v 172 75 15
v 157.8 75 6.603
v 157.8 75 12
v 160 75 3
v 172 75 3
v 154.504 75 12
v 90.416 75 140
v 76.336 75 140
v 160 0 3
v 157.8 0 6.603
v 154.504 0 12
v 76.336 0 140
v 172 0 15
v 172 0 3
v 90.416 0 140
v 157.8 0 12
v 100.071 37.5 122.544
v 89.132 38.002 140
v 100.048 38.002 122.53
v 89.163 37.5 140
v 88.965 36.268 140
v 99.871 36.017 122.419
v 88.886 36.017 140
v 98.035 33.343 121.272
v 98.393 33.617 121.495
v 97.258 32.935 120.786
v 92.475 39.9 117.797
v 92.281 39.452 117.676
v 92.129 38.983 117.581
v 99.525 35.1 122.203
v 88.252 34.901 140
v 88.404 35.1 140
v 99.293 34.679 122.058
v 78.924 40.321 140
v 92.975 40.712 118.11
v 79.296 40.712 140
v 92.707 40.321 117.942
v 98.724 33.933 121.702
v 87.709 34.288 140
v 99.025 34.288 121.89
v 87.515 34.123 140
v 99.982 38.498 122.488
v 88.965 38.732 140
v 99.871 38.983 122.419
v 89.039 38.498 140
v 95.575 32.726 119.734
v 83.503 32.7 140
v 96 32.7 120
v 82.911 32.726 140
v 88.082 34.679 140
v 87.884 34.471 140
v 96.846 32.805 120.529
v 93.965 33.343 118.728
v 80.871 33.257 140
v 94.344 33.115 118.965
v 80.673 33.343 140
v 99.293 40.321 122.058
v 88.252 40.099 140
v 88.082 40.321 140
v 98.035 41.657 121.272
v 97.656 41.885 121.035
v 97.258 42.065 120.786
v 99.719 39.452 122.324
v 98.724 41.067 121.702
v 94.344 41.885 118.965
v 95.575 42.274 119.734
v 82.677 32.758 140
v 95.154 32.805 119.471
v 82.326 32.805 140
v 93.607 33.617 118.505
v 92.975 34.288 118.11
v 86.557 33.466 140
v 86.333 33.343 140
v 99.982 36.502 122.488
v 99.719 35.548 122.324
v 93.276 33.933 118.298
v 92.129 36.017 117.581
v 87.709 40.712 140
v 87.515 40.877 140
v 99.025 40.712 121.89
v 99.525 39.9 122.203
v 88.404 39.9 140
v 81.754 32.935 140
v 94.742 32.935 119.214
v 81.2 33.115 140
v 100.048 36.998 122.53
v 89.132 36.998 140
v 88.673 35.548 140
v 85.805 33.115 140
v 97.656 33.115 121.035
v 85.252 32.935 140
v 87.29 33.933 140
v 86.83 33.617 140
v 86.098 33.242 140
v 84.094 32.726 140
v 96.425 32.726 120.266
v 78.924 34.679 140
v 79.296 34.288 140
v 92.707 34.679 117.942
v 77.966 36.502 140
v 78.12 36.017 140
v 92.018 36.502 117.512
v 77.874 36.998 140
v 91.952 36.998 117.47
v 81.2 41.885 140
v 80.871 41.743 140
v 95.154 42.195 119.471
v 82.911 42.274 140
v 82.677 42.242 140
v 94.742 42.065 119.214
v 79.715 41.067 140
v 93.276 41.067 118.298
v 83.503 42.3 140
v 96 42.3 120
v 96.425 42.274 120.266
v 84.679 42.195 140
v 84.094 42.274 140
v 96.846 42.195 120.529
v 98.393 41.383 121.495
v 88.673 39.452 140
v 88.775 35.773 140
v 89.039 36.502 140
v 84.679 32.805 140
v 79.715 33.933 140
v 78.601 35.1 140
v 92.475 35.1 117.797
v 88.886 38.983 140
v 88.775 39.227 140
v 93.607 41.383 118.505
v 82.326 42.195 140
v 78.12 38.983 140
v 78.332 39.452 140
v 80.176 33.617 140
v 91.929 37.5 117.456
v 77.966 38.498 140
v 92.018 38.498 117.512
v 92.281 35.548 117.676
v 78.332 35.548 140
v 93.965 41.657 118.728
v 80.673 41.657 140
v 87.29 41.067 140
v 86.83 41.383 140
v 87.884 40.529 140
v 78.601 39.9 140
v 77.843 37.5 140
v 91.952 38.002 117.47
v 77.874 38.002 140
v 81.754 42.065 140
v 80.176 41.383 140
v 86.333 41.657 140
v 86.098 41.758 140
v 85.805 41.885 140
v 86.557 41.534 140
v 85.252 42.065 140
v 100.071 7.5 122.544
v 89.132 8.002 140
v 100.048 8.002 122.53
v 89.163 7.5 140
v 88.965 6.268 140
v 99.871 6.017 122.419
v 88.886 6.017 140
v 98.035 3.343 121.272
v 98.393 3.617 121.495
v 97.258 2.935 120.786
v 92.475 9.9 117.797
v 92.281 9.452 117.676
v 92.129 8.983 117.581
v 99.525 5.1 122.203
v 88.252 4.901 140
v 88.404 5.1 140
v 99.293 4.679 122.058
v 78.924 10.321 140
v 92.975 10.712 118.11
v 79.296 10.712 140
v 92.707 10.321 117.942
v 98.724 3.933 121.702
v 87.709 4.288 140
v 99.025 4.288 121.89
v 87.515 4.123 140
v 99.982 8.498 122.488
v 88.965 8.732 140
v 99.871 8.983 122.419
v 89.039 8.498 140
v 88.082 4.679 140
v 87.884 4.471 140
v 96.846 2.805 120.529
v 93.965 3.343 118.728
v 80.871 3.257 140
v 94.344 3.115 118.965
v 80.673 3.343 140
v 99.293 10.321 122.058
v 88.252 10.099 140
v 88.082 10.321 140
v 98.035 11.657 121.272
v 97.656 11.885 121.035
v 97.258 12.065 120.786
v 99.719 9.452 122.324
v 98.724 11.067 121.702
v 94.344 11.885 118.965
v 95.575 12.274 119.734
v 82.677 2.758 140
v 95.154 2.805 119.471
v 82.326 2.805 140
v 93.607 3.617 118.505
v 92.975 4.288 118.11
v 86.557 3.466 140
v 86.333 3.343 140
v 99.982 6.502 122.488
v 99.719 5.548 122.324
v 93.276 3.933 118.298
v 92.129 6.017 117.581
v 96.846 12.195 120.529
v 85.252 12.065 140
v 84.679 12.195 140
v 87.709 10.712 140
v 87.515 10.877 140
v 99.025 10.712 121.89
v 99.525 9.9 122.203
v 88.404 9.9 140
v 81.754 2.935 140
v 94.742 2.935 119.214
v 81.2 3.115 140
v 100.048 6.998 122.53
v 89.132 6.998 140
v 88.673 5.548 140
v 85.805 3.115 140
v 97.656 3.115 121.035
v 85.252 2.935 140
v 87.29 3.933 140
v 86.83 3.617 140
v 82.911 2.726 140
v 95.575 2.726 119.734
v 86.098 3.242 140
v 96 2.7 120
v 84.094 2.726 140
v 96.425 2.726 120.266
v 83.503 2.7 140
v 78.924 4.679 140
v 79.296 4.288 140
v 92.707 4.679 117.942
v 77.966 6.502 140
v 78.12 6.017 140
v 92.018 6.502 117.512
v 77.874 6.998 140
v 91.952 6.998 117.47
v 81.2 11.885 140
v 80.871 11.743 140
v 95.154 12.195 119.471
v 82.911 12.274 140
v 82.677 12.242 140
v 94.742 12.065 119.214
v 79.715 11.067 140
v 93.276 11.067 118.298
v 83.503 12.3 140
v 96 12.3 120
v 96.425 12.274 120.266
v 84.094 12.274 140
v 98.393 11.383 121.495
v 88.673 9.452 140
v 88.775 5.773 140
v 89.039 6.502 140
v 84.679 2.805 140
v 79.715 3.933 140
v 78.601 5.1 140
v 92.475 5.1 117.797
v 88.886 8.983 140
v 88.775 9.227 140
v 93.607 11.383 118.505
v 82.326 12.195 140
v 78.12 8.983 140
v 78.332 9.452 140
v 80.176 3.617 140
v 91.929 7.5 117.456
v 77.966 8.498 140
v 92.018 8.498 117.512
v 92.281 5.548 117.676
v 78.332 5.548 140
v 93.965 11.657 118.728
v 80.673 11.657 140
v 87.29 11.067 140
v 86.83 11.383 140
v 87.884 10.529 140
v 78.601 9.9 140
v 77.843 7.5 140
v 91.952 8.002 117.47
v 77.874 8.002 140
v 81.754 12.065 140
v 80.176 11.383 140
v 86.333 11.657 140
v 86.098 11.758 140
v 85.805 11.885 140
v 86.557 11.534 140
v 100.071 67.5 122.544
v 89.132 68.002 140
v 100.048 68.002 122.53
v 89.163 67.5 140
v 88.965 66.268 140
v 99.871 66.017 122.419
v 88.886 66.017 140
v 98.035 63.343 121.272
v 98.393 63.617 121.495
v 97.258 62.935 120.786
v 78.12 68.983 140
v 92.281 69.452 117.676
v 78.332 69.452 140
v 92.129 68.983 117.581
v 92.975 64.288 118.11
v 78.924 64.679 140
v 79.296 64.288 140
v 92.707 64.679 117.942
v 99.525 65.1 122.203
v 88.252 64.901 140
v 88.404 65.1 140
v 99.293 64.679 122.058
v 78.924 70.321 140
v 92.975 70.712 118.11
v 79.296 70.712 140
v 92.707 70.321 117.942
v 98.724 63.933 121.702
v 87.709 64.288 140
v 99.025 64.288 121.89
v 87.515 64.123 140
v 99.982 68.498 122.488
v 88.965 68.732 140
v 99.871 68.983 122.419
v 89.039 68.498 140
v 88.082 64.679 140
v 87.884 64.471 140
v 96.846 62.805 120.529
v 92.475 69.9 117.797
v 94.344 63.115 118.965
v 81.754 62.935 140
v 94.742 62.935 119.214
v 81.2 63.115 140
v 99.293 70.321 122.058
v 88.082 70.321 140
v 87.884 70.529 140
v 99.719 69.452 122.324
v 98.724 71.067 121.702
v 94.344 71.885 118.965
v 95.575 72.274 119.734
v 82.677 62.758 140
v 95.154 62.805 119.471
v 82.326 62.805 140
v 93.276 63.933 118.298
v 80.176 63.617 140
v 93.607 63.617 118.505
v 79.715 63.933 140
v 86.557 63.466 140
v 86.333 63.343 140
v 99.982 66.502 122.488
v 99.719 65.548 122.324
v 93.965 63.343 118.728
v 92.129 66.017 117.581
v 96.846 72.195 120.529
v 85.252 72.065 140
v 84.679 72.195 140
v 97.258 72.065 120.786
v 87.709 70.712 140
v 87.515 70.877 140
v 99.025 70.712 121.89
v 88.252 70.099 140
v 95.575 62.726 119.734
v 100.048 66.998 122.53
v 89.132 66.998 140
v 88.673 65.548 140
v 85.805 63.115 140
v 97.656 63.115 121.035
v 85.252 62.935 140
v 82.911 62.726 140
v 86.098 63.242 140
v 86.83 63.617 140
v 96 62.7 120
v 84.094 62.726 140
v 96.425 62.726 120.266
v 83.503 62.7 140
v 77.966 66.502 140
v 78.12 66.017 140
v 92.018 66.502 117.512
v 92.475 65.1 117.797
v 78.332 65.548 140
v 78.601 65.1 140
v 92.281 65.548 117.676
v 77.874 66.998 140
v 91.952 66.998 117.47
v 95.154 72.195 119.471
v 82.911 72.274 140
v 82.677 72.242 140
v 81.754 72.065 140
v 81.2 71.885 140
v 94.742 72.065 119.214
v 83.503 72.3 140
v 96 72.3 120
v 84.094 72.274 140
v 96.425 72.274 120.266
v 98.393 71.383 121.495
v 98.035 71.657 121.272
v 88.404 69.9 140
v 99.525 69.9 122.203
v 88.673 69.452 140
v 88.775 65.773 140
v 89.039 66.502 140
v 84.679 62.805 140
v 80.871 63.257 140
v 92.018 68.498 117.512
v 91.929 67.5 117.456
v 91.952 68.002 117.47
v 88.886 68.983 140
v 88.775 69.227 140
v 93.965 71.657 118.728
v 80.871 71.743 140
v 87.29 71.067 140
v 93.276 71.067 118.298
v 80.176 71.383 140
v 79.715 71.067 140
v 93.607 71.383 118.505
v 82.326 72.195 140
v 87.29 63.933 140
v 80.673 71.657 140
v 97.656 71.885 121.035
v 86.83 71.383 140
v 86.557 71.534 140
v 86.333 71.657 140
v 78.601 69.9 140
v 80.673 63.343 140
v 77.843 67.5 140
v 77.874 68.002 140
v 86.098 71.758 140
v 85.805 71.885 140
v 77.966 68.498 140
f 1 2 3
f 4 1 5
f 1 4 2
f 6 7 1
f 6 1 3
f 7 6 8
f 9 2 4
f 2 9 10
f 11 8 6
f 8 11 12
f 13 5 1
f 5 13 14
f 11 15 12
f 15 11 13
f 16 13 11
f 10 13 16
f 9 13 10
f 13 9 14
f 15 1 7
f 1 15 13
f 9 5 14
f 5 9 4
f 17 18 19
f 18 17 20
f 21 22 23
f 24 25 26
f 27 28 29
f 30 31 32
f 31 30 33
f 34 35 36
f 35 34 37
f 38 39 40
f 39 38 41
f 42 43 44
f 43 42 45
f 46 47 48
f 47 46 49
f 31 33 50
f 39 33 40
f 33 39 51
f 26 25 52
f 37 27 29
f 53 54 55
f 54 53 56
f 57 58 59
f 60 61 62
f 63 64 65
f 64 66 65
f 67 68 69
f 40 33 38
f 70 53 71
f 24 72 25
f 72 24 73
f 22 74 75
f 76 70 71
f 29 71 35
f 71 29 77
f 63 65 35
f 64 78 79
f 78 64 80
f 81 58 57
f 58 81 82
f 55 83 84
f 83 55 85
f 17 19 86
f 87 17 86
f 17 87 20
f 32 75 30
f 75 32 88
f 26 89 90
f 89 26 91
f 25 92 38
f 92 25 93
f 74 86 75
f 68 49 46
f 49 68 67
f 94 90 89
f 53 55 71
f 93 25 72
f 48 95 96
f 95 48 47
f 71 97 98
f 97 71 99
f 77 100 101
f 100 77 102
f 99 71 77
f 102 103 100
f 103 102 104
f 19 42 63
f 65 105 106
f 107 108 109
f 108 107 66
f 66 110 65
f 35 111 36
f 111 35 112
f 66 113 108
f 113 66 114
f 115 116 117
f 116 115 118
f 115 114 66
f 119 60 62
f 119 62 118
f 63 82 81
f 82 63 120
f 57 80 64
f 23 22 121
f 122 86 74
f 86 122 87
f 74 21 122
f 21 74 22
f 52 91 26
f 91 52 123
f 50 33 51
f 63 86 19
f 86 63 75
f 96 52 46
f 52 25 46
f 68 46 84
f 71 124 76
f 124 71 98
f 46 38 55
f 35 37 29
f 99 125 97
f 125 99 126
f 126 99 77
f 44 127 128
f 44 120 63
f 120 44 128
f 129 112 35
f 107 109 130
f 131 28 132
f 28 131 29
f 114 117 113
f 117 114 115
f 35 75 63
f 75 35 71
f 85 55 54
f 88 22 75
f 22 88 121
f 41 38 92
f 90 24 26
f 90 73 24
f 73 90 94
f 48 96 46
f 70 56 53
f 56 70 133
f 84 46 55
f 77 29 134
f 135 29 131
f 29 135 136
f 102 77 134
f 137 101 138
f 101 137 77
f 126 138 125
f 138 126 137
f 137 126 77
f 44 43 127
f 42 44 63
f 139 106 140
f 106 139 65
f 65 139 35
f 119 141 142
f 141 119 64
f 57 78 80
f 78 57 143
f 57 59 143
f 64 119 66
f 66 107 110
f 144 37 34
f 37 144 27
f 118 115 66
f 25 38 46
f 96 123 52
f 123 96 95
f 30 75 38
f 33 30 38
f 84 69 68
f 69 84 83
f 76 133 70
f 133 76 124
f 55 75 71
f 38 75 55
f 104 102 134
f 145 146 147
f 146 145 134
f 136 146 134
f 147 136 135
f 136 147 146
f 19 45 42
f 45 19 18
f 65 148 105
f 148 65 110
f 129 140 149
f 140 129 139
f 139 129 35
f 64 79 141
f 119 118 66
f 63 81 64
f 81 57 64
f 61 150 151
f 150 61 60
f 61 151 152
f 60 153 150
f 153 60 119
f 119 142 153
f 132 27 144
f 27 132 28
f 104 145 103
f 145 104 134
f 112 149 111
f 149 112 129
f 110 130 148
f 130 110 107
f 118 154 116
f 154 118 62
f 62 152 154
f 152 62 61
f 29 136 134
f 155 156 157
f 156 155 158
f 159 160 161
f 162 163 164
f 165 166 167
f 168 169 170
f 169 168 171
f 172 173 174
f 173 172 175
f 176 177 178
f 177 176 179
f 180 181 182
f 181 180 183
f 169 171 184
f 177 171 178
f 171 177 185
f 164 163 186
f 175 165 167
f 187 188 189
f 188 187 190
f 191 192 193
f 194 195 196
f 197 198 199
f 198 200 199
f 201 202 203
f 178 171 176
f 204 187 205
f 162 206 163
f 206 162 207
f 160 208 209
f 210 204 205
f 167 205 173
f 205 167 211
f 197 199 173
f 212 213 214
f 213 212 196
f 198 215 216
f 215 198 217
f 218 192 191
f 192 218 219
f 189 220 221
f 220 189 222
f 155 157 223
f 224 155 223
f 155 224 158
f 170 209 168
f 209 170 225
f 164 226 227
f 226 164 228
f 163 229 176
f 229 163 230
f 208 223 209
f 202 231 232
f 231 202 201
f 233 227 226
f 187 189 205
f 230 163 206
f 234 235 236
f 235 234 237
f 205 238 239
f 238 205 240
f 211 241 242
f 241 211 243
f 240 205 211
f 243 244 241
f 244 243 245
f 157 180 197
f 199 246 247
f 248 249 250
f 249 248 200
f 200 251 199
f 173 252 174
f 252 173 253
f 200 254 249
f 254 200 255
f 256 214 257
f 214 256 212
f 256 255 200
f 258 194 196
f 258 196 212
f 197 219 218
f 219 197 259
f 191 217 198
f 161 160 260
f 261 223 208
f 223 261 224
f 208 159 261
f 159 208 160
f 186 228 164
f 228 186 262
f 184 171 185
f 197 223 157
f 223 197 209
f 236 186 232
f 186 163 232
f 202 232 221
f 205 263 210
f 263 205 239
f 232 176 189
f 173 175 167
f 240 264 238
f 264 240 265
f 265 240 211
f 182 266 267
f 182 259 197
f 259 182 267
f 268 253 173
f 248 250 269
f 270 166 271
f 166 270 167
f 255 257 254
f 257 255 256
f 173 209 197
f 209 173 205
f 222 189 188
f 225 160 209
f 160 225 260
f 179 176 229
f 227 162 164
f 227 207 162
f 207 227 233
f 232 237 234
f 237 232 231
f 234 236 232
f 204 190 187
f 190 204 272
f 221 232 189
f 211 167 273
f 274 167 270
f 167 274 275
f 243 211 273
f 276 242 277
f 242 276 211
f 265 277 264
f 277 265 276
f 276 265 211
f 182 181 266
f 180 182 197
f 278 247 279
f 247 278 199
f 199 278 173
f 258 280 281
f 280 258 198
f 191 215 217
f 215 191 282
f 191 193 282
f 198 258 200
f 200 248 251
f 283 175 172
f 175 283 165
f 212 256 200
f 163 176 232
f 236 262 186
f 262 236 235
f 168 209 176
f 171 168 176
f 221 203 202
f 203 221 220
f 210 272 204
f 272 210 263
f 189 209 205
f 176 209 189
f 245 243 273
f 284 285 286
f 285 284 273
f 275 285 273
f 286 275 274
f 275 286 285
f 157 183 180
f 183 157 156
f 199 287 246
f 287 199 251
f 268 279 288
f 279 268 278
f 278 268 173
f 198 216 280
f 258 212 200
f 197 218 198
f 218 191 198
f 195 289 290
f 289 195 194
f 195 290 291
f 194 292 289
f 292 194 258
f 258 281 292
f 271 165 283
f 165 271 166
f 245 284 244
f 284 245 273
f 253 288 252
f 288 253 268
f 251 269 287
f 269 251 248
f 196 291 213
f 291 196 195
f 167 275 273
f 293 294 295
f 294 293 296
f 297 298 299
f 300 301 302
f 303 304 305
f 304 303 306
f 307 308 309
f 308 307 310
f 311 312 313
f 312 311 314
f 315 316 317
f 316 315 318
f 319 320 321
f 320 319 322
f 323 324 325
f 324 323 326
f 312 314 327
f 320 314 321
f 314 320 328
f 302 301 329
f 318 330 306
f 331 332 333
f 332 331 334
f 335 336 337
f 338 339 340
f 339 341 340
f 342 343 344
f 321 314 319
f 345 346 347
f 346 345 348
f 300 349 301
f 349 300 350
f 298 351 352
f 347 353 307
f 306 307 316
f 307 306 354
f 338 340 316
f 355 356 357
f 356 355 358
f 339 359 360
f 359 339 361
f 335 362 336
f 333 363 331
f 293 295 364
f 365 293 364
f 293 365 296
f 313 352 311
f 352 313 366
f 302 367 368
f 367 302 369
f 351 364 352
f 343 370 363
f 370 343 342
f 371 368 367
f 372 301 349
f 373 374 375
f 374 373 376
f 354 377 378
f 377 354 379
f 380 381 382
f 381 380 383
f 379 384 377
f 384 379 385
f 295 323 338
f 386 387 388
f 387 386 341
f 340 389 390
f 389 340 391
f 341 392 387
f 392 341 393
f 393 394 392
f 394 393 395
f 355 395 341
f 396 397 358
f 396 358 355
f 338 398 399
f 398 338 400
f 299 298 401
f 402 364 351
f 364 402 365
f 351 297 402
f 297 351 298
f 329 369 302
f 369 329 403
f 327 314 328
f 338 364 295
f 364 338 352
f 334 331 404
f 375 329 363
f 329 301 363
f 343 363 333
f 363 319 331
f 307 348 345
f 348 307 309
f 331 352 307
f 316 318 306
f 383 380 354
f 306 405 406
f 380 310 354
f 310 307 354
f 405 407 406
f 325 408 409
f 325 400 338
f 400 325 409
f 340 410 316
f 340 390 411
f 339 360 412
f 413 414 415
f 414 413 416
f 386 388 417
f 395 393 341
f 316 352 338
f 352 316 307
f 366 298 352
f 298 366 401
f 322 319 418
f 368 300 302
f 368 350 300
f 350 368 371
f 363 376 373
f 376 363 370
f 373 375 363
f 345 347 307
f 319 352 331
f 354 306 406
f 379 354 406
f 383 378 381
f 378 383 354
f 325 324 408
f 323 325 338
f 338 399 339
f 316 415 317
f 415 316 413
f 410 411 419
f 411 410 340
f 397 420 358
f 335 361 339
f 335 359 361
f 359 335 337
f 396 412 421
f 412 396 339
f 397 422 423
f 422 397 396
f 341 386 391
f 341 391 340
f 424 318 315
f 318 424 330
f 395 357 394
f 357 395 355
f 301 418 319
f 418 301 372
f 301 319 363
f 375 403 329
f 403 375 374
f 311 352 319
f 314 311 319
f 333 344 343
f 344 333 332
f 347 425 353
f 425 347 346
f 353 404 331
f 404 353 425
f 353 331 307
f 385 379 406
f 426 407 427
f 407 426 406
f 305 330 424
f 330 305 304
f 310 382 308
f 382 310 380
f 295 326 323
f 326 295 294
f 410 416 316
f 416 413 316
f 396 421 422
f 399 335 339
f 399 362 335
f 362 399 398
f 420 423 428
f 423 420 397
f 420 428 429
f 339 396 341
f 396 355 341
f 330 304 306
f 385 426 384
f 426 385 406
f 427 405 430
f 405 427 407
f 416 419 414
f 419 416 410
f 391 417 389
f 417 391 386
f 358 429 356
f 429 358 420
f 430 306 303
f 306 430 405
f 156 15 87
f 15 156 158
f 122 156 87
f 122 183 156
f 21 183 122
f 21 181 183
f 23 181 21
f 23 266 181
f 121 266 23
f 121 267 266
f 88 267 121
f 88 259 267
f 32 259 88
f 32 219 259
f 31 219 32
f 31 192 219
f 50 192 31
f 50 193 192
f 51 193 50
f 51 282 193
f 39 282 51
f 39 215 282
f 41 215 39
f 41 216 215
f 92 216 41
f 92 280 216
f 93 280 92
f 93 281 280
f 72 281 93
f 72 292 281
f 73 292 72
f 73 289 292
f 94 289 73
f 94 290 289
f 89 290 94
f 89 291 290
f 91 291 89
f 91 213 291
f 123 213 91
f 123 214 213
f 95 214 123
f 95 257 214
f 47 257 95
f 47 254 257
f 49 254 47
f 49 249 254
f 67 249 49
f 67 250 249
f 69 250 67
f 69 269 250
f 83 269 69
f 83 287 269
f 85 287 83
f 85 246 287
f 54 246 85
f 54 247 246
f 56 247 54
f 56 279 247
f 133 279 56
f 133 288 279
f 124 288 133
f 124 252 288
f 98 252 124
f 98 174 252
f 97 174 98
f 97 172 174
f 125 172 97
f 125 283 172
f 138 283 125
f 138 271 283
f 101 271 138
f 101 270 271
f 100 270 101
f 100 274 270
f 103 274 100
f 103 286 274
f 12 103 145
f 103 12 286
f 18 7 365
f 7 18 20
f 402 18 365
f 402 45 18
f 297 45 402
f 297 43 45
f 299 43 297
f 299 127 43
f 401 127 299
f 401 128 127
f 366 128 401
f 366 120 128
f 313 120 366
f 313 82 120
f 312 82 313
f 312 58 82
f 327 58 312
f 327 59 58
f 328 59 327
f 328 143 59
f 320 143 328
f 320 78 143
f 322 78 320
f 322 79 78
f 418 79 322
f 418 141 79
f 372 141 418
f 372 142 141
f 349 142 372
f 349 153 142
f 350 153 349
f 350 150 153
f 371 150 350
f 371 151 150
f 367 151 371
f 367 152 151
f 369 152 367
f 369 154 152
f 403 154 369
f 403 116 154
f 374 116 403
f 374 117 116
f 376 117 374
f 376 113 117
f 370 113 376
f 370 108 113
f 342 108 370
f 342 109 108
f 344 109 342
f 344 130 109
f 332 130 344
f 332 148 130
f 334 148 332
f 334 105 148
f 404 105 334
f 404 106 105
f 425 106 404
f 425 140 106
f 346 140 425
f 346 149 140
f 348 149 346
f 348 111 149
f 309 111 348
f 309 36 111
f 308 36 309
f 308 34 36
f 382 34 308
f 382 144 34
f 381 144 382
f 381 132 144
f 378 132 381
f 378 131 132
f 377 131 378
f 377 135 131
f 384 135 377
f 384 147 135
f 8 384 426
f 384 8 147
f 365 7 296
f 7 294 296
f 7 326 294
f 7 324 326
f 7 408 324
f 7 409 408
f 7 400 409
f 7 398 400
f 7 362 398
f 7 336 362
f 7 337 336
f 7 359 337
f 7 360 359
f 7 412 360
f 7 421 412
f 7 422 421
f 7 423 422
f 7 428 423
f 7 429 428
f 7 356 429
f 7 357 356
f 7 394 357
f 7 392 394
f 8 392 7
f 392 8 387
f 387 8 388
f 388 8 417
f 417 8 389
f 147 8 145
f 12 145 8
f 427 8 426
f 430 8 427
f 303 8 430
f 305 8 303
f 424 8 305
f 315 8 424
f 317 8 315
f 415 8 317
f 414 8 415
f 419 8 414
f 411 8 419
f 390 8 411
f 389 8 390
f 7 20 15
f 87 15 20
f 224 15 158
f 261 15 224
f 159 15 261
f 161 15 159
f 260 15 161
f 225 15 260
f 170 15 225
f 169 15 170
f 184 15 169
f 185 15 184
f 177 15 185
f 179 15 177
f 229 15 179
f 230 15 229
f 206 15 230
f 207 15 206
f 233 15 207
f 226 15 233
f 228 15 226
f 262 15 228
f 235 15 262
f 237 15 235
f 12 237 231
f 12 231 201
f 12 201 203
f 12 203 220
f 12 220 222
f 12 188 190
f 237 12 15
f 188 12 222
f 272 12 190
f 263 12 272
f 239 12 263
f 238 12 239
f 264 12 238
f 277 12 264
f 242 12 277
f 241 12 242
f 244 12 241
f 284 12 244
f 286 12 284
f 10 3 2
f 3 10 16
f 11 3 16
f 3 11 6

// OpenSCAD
//Bike_Photo_Stand
//Made by Josh and Crystal Sanders <3
//07/04/23
//Print in SemiFlex material so that we can use the mold for epoxy. 

//Units are in mm


//45mm diameter for bike connection
//300mm long arm (roughly)
//280mm straight from the ground
//120 -180mm from the right angle

//Set up the variables

height_stand = 280;
stopper_distance_from_bike = 180;
radius_stopper = 18;
width_stand = 75;
radius_cutout = 22.5;
depth_base = 12;
depth_cutout = 18;

$fn=60;

module angled_stand ()
{
    // This module makes the part that touches the ground at an angle to hold the bike in position.
    difference()
    {
        hull()
        {
            //top of stand
            translate([0,0,height_stand-(depth_base*1.25)])
            {
                cube([1,width_stand,depth_base]);
            }
            
            //bottom of top half
            translate([stopper_distance_from_bike - 20,0,depth_base/4])
            {
                cube([depth_base, width_stand, depth_base]);
            }
        }
        
        bike_clip();
    }
    
}

module floor_stopper()
{
    // This module makes the part that lays against the ground and provides friction to keep the angled_stand from sliding away from the bike.    
    difference()
    {
        //round base
        rotate([90, 0, 0])
        {
            translate([stopper_distance_from_bike-15, 0, -width_stand/2])
            {
                cylinder(width_stand*1, radius_stopper, radius_stopper, center = true);
            }
        }
           
        //--flat bottom
        rotate([90, 0, 0])
        {
            translate([stopper_distance_from_bike-radius_stopper-9, -radius_stopper-10, -width_stand])
            {
                cube([depth_base*2, depth_base, width_stand]);
            }
        }
        
        //--insert for angled_stand
        bottom_half();
    }  
}

module bike_clip()
{
    // This module makes the part that holds the bottom bracket.  
    translate([depth_cutout,width_stand/2, height_stand - radius_cutout])
    {
        hull()
        {
            translate([0, 0, radius_cutout*1.5])
            {
                cube([2*depth_cutout, 2.5*radius_cutout, depth_cutout/4], center= true);
            }
            
            rotate([0,90,0])
            {
                cylinder(h = 4*depth_cutout, r = radius_cutout, center= true);
            }
        }
    }
}

module top_half()
{
    difference()
    {
        angled_stand();
        cube([1.5*stopper_distance_from_bike, width_stand, height_stand/2]);
    }
    
    connecting_pins();
}

module connecting_pins()
{
    pin_height = 40;
    pin_radius_ratio = 0.4;
    pin_angle = -32;
    pin_x = stopper_distance_from_bike*.6 - depth_base;
    pin_z = (height_stand-pin_height)/2;
    
    //middle pin
    translate([pin_x, width_stand/2, pin_z])
    {
        rotate([0, pin_angle, 0])
        {
            cylinder(pin_height, depth_base*pin_radius_ratio, depth_base*pin_radius_ratio);
        }
    }
    
    //left pin
    translate([pin_x, width_stand*0.1, pin_z])
    {
        rotate([0, pin_angle, 0])
        {
            cylinder(pin_height, depth_base*pin_radius_ratio, depth_base*pin_radius_ratio);
        }
    }
    
    //right pin
    translate([pin_x, width_stand*0.9, pin_z])
    {
        rotate([0, pin_angle, 0])
        {
            cylinder(pin_height, depth_base*pin_radius_ratio, depth_base*pin_radius_ratio);
        }
    }
}

module bottom_half()
{
    difference()
    {
        angled_stand();
        
        //--top half
        translate([0,0,height_stand/2])
        {
            cube([1.5*stopper_distance_from_bike, width_stand, height_stand]);
        }
        
        //--connecting pins
        connecting_pins();
       
       //--rear slantent edge
       translate([stopper_distance_from_bike-radius_stopper*1.9, 0, 0])
       {
           cube([depth_base, width_stand, depth_base]);
       }
    }
}

//bike_clip();
//top_half();
//connecting_pins();
bottom_half();
//angled_stand();
//floor_stopper();
